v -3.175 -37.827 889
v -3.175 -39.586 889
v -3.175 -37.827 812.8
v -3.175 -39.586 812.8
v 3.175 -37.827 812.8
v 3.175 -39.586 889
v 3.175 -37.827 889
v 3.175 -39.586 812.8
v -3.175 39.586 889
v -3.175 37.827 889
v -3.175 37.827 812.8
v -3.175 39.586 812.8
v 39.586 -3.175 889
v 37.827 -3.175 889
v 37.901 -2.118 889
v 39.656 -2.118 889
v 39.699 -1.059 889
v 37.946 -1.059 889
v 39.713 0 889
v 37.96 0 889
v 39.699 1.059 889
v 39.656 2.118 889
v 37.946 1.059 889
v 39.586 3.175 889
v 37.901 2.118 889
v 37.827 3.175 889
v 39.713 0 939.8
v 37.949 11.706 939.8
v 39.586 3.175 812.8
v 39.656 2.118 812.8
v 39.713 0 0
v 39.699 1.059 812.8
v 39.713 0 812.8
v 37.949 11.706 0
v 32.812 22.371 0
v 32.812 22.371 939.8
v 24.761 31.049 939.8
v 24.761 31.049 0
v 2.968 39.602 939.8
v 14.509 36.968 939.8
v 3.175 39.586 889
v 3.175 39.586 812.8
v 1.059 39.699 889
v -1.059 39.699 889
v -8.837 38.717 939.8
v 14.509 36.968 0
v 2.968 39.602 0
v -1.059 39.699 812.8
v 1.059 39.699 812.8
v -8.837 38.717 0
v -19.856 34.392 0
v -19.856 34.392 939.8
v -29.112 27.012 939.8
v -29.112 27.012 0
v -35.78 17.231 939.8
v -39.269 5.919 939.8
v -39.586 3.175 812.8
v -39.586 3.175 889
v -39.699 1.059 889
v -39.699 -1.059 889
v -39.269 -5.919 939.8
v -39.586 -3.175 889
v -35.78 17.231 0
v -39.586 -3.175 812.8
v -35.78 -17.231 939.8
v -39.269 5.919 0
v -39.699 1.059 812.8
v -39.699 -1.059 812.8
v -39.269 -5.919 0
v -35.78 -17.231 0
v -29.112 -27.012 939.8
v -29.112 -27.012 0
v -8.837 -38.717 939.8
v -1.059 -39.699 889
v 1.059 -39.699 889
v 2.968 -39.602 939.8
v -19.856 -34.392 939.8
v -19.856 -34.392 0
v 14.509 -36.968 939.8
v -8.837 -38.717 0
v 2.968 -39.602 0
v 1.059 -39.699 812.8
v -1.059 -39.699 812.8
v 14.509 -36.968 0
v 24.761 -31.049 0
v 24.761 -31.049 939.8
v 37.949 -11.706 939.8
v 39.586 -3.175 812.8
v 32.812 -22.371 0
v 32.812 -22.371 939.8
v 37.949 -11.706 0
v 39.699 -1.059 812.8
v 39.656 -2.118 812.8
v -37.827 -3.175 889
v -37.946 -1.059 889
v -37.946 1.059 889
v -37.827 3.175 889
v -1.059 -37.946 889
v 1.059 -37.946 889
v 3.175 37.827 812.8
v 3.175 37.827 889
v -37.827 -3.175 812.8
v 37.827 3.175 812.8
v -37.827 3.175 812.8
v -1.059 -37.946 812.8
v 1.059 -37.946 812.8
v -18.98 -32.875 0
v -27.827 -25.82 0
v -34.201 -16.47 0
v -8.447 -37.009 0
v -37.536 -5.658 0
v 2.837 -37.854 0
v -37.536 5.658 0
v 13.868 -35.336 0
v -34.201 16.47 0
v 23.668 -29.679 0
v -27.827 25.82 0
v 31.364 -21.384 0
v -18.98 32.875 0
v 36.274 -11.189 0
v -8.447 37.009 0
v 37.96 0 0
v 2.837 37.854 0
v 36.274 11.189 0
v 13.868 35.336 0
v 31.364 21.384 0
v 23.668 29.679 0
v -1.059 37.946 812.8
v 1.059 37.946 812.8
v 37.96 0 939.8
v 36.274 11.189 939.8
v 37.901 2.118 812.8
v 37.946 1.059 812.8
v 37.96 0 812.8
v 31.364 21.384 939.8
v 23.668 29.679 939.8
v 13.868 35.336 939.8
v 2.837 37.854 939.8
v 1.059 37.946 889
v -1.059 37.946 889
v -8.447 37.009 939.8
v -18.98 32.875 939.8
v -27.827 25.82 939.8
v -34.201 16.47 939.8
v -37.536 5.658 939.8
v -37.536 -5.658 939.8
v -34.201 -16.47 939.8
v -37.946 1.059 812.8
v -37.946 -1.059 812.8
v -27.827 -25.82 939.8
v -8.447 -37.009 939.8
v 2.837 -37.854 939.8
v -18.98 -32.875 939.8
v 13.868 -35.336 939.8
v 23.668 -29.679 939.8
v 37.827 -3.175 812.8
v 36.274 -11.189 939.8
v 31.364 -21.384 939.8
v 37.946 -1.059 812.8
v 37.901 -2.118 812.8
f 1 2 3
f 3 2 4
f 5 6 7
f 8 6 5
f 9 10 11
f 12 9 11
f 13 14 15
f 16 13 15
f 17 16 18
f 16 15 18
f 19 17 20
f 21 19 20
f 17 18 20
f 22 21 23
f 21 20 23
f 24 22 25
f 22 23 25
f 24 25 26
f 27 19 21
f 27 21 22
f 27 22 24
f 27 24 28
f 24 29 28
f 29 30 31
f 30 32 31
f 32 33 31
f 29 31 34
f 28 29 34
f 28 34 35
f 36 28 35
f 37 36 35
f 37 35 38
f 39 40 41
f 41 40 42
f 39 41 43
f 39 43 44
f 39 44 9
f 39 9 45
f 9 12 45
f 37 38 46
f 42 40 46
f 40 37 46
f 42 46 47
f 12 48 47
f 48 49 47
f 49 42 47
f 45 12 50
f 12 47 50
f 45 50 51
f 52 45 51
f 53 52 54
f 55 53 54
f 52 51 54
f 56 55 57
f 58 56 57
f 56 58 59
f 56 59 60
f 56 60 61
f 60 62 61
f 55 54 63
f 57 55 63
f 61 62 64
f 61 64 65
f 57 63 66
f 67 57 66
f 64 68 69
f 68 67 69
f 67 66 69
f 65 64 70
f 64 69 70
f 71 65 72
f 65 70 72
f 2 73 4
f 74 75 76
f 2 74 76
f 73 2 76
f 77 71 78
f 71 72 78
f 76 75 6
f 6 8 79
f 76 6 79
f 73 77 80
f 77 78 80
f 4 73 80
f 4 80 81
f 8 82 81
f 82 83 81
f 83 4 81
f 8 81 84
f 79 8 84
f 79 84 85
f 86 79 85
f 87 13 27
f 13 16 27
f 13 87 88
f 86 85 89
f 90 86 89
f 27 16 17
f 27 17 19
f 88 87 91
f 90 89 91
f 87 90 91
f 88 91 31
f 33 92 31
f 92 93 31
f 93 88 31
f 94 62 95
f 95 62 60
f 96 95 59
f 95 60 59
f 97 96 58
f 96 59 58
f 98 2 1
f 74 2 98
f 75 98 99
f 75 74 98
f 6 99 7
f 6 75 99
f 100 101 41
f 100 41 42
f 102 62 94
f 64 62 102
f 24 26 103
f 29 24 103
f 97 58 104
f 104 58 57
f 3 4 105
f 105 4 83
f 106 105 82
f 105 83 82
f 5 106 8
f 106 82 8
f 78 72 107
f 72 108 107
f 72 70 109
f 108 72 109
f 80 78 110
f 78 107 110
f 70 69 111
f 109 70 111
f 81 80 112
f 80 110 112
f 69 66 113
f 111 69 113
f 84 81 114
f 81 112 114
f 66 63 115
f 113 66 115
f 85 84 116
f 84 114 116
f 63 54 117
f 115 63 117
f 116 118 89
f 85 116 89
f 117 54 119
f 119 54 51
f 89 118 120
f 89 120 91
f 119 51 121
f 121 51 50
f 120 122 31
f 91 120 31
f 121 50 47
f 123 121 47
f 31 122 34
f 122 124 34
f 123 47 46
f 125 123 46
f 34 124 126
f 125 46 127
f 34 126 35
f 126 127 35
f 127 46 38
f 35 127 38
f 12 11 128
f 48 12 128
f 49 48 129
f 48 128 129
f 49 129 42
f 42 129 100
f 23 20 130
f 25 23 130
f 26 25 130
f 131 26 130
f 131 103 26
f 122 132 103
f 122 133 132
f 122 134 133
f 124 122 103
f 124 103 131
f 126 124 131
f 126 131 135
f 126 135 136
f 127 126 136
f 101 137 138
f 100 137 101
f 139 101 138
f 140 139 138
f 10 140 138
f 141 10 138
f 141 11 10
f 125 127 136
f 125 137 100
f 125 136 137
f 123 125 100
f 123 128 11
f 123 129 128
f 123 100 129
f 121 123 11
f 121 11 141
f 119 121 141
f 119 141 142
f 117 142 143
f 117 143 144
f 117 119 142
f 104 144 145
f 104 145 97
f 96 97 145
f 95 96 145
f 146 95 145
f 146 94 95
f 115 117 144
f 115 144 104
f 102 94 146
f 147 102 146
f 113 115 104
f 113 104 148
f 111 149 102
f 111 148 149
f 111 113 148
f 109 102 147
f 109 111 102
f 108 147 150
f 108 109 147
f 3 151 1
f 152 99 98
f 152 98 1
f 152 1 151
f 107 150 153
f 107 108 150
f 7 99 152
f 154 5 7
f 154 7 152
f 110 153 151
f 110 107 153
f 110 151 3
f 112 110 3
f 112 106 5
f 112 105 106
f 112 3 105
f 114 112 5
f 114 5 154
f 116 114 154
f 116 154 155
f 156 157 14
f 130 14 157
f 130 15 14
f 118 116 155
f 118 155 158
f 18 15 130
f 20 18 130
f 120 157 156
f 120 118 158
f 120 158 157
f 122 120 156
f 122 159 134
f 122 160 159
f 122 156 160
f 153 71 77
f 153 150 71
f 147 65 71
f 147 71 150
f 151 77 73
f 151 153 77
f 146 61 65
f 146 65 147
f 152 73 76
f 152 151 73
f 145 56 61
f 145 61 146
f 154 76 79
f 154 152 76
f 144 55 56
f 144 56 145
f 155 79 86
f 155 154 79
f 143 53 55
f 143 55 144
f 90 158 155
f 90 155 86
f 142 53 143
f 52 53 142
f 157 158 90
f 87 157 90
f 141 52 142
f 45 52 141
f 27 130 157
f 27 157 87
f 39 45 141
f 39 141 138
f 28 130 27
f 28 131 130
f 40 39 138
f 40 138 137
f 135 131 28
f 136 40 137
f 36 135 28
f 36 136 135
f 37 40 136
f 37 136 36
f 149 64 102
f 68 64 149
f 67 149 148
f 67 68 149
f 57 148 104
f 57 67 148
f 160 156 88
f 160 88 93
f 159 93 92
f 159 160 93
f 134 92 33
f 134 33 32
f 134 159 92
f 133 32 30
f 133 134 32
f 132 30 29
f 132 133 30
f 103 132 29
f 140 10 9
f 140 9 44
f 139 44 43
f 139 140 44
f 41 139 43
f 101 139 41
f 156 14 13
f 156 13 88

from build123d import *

# Parameters (mm, degrees)
SKETCH1_R               = 39.7129
SKETCH1_R_2             = 37.9603
BOSS_EXTRUDE1_DEPTH     = 939.8
CUT_EXTRUDE1_DEPTH      = 942.476642755
CUT_EXTRUDE1_DEPTH_BACK = 942.476642755
SKETCH3_W               = 6.35
SKETCH3_H               = 76.2
CUT_EXTRUDE2_DEPTH      = 942.476642755
CUT_EXTRUDE2_DEPTH_BACK = 942.476642755
SKETCH4_W               = 76.2
SKETCH4_H               = 6.35


with BuildPart() as part:
    # Sketch1 → Boss-Extrude1 (new body)
    with BuildSketch(Plane.XY):
        Circle(SKETCH1_R)
        Circle(SKETCH1_R_2, mode=Mode.SUBTRACT)
    extrude(amount=BOSS_EXTRUDE1_DEPTH)

    # Sketch3 → Cut-Extrude1 (cut, two sides: drawn at the far end of the back side and taken through both)
    with BuildSketch(Plane(origin=(0, 0, 0), x_dir=(1, 0, 0), z_dir=(0, 1, 0)).offset(-CUT_EXTRUDE1_DEPTH_BACK)):
        with Locations((0, -850.9)):
            Rectangle(SKETCH3_W, SKETCH3_H)
    extrude(amount=CUT_EXTRUDE1_DEPTH + CUT_EXTRUDE1_DEPTH_BACK, mode=Mode.SUBTRACT)

    # Sketch4 → Cut-Extrude2 (cut, two sides: drawn at the far end of the back side and taken through both)
    with BuildSketch(Plane(origin=(0, 0, 0), x_dir=(0, 0, -1), z_dir=(1, 0, 0)).offset(-CUT_EXTRUDE2_DEPTH_BACK)):
        with Locations((-850.9, 0)):
            Rectangle(SKETCH4_W, SKETCH4_H)
    extrude(amount=CUT_EXTRUDE2_DEPTH + CUT_EXTRUDE2_DEPTH_BACK, mode=Mode.SUBTRACT)


solid = part.part
